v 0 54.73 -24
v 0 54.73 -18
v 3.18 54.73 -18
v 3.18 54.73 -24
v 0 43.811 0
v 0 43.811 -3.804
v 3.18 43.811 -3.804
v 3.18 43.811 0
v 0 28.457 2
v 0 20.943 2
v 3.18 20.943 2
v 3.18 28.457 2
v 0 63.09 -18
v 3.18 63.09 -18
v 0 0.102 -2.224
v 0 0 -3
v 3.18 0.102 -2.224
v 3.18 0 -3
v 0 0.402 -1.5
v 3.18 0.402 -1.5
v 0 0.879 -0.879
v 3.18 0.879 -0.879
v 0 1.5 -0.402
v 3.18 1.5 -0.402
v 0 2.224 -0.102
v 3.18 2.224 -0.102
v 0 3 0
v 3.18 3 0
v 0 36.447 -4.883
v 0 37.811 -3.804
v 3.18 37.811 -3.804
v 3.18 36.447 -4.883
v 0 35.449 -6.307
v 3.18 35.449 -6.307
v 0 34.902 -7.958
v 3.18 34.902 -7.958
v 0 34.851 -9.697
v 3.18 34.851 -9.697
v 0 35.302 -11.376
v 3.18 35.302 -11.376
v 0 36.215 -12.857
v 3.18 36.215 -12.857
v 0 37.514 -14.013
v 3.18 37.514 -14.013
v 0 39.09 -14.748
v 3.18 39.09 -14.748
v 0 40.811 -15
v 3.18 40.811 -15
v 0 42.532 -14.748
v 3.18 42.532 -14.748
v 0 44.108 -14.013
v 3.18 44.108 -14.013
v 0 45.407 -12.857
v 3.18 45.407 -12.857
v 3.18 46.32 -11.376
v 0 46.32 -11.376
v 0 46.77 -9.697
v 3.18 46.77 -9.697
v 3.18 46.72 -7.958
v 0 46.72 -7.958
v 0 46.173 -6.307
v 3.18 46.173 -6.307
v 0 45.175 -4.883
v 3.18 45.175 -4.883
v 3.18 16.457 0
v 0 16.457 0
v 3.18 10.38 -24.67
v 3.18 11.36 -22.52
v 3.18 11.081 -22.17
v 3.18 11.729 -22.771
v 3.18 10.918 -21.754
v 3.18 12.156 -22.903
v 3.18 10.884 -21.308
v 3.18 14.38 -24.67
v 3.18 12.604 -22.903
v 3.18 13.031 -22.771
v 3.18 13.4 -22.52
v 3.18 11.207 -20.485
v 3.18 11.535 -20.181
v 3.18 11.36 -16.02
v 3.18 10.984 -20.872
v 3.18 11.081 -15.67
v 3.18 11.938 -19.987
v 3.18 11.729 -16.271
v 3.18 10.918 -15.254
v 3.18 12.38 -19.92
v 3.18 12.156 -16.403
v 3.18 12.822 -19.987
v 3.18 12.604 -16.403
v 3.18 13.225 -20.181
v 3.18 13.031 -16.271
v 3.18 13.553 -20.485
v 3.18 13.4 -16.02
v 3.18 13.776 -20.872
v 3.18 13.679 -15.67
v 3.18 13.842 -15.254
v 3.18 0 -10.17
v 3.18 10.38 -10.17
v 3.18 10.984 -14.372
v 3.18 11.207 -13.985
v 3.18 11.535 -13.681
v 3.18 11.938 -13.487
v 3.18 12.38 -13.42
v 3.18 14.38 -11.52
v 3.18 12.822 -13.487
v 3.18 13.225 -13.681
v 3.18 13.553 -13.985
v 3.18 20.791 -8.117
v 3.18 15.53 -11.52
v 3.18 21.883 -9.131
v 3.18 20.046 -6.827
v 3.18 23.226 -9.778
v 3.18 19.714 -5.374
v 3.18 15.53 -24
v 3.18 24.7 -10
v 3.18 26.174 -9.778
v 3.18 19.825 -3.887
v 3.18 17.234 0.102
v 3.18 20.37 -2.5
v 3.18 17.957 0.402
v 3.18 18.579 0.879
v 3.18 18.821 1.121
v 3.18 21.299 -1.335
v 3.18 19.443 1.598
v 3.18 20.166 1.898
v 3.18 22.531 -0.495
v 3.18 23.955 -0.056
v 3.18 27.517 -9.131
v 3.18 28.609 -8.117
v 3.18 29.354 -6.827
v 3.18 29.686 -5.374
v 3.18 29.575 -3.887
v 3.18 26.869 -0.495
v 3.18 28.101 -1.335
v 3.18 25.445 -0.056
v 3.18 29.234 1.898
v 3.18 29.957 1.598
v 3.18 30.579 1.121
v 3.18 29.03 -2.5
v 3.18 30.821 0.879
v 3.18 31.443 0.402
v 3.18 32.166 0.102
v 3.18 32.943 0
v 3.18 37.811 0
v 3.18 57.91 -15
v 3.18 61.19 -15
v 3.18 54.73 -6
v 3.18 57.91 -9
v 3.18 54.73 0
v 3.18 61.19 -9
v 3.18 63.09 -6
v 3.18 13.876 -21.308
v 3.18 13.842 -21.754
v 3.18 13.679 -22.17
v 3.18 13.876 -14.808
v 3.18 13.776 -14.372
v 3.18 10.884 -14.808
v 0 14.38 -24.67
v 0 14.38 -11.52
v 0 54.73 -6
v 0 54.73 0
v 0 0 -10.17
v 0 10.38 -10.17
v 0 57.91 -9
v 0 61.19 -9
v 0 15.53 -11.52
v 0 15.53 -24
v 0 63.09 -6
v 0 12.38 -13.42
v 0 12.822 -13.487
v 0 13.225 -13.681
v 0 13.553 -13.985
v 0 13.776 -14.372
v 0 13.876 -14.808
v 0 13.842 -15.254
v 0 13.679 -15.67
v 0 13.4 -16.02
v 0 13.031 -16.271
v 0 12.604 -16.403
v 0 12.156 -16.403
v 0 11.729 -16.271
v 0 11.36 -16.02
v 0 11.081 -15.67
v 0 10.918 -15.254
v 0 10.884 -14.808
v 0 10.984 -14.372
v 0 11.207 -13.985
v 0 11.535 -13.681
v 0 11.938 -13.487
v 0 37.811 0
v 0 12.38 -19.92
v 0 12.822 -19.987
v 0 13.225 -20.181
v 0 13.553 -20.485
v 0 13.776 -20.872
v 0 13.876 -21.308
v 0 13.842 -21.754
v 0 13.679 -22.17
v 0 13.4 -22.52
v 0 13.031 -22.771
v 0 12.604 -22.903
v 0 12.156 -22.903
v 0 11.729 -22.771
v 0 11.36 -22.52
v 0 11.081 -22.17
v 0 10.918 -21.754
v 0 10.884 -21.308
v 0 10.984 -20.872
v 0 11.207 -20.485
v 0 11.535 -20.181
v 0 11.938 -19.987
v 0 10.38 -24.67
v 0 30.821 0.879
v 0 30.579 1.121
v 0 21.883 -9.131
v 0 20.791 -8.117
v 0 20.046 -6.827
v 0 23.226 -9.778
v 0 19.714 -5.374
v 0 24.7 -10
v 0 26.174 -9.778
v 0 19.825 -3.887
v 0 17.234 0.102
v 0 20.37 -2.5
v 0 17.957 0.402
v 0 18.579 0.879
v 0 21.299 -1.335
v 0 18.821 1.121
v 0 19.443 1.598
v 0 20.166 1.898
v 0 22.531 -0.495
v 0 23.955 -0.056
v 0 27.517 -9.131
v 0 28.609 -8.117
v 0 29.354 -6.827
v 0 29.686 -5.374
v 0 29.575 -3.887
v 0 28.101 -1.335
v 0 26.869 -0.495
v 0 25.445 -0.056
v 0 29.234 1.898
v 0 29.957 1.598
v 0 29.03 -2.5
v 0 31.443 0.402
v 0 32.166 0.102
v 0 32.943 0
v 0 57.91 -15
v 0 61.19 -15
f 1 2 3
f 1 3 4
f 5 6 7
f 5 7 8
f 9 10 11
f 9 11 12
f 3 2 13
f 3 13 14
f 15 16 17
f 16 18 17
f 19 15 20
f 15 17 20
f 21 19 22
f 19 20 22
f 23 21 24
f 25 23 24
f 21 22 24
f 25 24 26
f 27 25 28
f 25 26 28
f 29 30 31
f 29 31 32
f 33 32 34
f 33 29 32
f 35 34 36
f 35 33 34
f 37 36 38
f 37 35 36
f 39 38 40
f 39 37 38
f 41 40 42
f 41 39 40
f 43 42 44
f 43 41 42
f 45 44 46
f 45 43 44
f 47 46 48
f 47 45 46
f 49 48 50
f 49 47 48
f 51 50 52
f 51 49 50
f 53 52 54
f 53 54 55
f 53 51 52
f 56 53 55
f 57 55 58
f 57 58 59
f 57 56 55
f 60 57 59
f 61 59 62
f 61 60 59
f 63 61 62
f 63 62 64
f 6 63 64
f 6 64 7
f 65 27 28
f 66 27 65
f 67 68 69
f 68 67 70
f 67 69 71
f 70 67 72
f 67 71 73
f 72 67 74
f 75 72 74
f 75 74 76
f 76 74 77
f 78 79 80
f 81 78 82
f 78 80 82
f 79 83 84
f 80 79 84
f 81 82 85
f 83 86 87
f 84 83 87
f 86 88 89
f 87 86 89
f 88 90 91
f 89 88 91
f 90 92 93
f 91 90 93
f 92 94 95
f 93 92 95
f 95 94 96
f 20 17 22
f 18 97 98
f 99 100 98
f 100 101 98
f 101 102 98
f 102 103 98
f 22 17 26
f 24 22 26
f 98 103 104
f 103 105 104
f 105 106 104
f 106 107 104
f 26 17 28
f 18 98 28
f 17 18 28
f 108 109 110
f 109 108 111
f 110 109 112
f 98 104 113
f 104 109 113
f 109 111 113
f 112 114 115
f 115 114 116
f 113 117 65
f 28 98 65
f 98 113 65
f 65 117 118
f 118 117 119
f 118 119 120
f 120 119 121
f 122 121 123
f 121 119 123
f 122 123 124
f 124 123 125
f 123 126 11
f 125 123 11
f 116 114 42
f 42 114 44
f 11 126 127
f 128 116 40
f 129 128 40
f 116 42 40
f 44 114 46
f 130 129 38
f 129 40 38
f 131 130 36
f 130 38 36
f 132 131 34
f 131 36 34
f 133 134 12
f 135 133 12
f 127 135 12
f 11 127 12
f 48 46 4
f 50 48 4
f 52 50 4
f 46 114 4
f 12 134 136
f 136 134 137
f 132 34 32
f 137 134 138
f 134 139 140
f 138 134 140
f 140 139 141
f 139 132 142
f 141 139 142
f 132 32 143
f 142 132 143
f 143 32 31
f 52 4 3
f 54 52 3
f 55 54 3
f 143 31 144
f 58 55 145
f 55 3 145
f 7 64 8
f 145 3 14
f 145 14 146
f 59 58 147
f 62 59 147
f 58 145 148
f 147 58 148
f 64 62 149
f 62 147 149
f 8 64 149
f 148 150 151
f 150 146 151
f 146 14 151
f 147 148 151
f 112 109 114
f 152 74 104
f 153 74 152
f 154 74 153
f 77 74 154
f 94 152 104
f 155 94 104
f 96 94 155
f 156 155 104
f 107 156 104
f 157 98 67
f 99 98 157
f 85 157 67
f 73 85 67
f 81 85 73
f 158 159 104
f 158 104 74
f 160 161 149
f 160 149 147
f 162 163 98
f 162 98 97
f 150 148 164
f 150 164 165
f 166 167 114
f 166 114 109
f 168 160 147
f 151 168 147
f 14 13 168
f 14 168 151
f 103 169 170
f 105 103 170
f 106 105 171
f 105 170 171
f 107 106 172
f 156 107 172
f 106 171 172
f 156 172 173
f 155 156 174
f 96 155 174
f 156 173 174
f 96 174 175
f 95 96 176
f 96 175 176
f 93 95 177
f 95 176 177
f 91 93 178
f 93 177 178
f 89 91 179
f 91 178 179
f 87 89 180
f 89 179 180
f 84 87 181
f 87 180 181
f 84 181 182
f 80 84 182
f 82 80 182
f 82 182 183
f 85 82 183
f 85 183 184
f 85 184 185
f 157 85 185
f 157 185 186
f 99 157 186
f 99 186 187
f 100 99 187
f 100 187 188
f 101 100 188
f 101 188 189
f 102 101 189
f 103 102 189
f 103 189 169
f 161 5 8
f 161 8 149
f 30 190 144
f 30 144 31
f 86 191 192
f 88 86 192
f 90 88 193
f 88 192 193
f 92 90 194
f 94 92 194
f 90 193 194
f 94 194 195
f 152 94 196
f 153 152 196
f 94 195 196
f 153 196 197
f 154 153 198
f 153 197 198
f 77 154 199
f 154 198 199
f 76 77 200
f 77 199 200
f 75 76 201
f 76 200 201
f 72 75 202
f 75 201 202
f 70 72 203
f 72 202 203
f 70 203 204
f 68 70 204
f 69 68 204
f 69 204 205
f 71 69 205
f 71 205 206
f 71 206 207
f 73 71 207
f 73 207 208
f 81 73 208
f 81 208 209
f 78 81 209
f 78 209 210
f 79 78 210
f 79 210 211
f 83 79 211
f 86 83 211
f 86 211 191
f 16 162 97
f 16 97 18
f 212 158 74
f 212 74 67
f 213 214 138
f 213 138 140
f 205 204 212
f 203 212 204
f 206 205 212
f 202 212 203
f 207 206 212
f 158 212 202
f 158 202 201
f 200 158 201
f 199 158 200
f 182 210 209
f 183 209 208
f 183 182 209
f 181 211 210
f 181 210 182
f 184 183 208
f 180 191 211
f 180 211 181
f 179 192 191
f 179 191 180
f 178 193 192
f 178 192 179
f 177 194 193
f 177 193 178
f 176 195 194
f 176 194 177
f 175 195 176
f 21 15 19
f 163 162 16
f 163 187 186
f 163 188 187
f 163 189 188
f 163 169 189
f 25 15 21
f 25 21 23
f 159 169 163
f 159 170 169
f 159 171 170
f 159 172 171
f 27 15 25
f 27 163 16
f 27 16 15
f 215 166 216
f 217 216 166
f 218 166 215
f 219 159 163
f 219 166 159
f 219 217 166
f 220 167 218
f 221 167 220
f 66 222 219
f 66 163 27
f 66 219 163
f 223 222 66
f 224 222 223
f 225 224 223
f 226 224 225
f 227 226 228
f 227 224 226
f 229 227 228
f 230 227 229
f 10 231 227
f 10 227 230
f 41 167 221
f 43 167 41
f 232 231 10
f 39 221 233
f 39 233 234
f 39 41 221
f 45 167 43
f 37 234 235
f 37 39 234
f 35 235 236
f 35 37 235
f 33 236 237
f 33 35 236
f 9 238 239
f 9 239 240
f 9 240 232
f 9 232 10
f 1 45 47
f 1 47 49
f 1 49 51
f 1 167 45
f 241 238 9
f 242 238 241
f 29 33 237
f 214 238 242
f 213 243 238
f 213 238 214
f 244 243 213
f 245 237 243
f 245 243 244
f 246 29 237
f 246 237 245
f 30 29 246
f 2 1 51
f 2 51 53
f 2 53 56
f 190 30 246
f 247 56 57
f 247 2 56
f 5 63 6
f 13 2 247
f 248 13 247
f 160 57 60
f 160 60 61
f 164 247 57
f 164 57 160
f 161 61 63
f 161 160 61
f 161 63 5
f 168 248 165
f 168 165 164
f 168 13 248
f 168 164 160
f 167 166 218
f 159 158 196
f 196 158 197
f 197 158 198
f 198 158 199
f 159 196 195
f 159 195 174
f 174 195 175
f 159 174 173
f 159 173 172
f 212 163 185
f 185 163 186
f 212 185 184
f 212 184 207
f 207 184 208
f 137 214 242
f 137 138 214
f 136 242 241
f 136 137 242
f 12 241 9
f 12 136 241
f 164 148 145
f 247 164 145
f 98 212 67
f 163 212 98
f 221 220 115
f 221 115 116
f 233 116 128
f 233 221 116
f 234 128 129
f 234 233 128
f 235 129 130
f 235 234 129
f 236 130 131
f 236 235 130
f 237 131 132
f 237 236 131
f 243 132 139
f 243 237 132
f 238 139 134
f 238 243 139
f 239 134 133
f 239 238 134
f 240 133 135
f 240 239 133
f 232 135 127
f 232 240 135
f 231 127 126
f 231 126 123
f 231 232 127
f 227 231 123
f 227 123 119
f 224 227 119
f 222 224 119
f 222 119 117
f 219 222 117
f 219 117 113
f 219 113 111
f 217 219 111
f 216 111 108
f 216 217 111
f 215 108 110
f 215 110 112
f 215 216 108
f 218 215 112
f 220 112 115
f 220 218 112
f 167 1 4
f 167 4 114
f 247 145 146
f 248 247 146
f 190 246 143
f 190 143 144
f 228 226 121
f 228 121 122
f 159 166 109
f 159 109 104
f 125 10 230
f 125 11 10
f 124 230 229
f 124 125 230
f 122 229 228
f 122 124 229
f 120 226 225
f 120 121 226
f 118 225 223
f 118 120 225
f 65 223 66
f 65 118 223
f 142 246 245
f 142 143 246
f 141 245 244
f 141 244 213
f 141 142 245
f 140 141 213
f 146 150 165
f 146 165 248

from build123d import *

# Parameters (mm, degrees)
BOSS_EXTRUDE1_DEPTH     = 3.18
SKETCH2_4_OUTSIDE_W     = 40.864
SKETCH2_4_OUTSIDE_H     = 68.924
SKETCH2_4_OUTSIDE_R     = 5
CUT_EXTRUDE2_DEPTH      = 3.18
FILLET6_R               = 3
M3_5X0_6_TAPPED_HOLE1_D = 3
SKETCH9_W               = 3.18
SKETCH9_H               = 12
BOSS_EXTRUDE2_DEPTH     = 8.36
SKETCH10_W              = 6
SKETCH10_H              = 3.28
CUT_EXTRUDE3_DEPTH      = 68.81643901


with BuildPart() as part:
    # Sketch2 → Boss-Extrude1 (new body)
    with BuildSketch(Plane(origin=(0, 0, 0), x_dir=(0, 0, -1), z_dir=(1, 0, 0))):
        with BuildLine():
            Line((0, 54.73), (24, 54.73))
            Line((24, 54.73), (24, 15.53))
            Line((24, 15.53), (11.52, 15.53))
            Line((11.52, 15.53), (11.52, 14.38))
            Line((11.52, 14.38), (24.67, 14.38))
            Line((24.67, 14.38), (24.67, 10.38))
            Line((24.67, 10.38), (10.17, 10.38))
            Line((10.17, 10.38), (10.17, 0))
            Line((10.17, 0), (0, 0))
            Line((0, 0), (0, 17.7))
            Line((0, 17.7), (-2, 19.7))
            Line((-2, 19.7), (-2, 29.7))
            Line((-2, 29.7), (0, 31.7))
            Line((0, 31.7), (0, 37.810865899))
            Line((0, 37.810865899), (3.803847577, 37.810865899))
            ThreePointArc((3.803847577, 37.810865899), (15, 40.810865899), (3.803847577, 43.810865899))
            Line((3.803847577, 43.810865899), (0, 43.810865899))
            Line((0, 43.810865899), (0, 54.73))
        make_face()
    extrude(amount=-BOSS_EXTRUDE1_DEPTH)

    # Sketch2<4> outside → Cut-Extrude2 (cut)
    # profile 1 of 2: a face of its own
    with BuildSketch(Plane(origin=(0, 0, 0), x_dir=(0, 0, -1), z_dir=(1, 0, 0))):
        with Locations((11.335, 27.365)):
            Rectangle(SKETCH2_4_OUTSIDE_W, SKETCH2_4_OUTSIDE_H)
        with BuildLine():
            Line((0, 54.73), (24, 54.73))
            Line((24, 54.73), (24, 15.53))
            Line((24, 15.53), (11.52, 15.53))
            Line((11.52, 15.53), (11.52, 14.38))
            Line((11.52, 14.38), (24.67, 14.38))
            Line((24.67, 14.38), (24.67, 10.38))
            Line((24.67, 10.38), (10.17, 10.38))
            Line((10.17, 10.38), (10.17, 0))
            Line((10.17, 0), (0, 0))
            Line((0, 0), (0, 17.7))
            Line((0, 17.7), (-2, 19.7))
            Line((-2, 19.7), (-2, 29.7))
            Line((-2, 29.7), (0, 31.7))
            Line((0, 31.7), (0, 37.810865899))
            Line((0, 37.810865899), (3.803847577, 37.810865899))
            ThreePointArc((3.803847577, 37.810865899), (15, 40.810865899), (3.803847577, 43.810865899))
            Line((3.803847577, 43.810865899), (0, 43.810865899))
            Line((0, 43.810865899), (0, 54.73))
        make_face(mode=Mode.SUBTRACT)
    # profile 2 of 2: a face of its own
    with BuildSketch(Plane(origin=(0, 0, 0), x_dir=(0, 0, -1), z_dir=(1, 0, 0))):
        with Locations((5, 24.7)):
            Circle(SKETCH2_4_OUTSIDE_R)
    extrude(amount=-CUT_EXTRUDE2_DEPTH, mode=Mode.SUBTRACT)

    # Fillet6
    fillet6_edges = [part.edges().sort_by_distance(p)[0] for p in [
        (-1.59, 31.7, 0),
        (-1.59, 29.7, 2),
        (-1.59, 19.7, 2),
        (-1.59, 17.7, 0),
        (-1.59, 0, 0),
    ]]
    fillet(fillet6_edges, radius=FILLET6_R)


with BuildPart() as body_2:
    # Mirror1: mirrored copy
    add(part.part.mirror(Plane(origin=(0, 40.810865899, -9), x_dir=(0, 0, 1), z_dir=(1, 0, 0))))

    # M3.5x0.6 Tapped Hole1 (through all)
    with Locations(Plane(origin=(3.18, 0, 0), x_dir=(0, 0, -1), z_dir=(1, 0, 0))):
        with Locations((21.42, 12.38), (14.92, 12.38)):
            Hole(M3_5X0_6_TAPPED_HOLE1_D / 2)

    # Sketch9 → Boss-Extrude2 (add)
    with BuildSketch(Plane(origin=(0, 54.73, 0), x_dir=(1, 0, 0), z_dir=(0, 1, 0))):
        with Locations((1.59, 12)):
            Rectangle(SKETCH9_W, SKETCH9_H)
    extrude(amount=BOSS_EXTRUDE2_DEPTH)

    # Sketch10 → Cut-Extrude3 (cut, through all)
    with BuildSketch(Plane(origin=(3.18, 0, 0), x_dir=(0, 0, -1), z_dir=(1, 0, 0))):
        with Locations((12, 59.55)):
            Rectangle(SKETCH10_W, SKETCH10_H)
    extrude(amount=-CUT_EXTRUDE3_DEPTH, mode=Mode.SUBTRACT)


solid = body_2.part
